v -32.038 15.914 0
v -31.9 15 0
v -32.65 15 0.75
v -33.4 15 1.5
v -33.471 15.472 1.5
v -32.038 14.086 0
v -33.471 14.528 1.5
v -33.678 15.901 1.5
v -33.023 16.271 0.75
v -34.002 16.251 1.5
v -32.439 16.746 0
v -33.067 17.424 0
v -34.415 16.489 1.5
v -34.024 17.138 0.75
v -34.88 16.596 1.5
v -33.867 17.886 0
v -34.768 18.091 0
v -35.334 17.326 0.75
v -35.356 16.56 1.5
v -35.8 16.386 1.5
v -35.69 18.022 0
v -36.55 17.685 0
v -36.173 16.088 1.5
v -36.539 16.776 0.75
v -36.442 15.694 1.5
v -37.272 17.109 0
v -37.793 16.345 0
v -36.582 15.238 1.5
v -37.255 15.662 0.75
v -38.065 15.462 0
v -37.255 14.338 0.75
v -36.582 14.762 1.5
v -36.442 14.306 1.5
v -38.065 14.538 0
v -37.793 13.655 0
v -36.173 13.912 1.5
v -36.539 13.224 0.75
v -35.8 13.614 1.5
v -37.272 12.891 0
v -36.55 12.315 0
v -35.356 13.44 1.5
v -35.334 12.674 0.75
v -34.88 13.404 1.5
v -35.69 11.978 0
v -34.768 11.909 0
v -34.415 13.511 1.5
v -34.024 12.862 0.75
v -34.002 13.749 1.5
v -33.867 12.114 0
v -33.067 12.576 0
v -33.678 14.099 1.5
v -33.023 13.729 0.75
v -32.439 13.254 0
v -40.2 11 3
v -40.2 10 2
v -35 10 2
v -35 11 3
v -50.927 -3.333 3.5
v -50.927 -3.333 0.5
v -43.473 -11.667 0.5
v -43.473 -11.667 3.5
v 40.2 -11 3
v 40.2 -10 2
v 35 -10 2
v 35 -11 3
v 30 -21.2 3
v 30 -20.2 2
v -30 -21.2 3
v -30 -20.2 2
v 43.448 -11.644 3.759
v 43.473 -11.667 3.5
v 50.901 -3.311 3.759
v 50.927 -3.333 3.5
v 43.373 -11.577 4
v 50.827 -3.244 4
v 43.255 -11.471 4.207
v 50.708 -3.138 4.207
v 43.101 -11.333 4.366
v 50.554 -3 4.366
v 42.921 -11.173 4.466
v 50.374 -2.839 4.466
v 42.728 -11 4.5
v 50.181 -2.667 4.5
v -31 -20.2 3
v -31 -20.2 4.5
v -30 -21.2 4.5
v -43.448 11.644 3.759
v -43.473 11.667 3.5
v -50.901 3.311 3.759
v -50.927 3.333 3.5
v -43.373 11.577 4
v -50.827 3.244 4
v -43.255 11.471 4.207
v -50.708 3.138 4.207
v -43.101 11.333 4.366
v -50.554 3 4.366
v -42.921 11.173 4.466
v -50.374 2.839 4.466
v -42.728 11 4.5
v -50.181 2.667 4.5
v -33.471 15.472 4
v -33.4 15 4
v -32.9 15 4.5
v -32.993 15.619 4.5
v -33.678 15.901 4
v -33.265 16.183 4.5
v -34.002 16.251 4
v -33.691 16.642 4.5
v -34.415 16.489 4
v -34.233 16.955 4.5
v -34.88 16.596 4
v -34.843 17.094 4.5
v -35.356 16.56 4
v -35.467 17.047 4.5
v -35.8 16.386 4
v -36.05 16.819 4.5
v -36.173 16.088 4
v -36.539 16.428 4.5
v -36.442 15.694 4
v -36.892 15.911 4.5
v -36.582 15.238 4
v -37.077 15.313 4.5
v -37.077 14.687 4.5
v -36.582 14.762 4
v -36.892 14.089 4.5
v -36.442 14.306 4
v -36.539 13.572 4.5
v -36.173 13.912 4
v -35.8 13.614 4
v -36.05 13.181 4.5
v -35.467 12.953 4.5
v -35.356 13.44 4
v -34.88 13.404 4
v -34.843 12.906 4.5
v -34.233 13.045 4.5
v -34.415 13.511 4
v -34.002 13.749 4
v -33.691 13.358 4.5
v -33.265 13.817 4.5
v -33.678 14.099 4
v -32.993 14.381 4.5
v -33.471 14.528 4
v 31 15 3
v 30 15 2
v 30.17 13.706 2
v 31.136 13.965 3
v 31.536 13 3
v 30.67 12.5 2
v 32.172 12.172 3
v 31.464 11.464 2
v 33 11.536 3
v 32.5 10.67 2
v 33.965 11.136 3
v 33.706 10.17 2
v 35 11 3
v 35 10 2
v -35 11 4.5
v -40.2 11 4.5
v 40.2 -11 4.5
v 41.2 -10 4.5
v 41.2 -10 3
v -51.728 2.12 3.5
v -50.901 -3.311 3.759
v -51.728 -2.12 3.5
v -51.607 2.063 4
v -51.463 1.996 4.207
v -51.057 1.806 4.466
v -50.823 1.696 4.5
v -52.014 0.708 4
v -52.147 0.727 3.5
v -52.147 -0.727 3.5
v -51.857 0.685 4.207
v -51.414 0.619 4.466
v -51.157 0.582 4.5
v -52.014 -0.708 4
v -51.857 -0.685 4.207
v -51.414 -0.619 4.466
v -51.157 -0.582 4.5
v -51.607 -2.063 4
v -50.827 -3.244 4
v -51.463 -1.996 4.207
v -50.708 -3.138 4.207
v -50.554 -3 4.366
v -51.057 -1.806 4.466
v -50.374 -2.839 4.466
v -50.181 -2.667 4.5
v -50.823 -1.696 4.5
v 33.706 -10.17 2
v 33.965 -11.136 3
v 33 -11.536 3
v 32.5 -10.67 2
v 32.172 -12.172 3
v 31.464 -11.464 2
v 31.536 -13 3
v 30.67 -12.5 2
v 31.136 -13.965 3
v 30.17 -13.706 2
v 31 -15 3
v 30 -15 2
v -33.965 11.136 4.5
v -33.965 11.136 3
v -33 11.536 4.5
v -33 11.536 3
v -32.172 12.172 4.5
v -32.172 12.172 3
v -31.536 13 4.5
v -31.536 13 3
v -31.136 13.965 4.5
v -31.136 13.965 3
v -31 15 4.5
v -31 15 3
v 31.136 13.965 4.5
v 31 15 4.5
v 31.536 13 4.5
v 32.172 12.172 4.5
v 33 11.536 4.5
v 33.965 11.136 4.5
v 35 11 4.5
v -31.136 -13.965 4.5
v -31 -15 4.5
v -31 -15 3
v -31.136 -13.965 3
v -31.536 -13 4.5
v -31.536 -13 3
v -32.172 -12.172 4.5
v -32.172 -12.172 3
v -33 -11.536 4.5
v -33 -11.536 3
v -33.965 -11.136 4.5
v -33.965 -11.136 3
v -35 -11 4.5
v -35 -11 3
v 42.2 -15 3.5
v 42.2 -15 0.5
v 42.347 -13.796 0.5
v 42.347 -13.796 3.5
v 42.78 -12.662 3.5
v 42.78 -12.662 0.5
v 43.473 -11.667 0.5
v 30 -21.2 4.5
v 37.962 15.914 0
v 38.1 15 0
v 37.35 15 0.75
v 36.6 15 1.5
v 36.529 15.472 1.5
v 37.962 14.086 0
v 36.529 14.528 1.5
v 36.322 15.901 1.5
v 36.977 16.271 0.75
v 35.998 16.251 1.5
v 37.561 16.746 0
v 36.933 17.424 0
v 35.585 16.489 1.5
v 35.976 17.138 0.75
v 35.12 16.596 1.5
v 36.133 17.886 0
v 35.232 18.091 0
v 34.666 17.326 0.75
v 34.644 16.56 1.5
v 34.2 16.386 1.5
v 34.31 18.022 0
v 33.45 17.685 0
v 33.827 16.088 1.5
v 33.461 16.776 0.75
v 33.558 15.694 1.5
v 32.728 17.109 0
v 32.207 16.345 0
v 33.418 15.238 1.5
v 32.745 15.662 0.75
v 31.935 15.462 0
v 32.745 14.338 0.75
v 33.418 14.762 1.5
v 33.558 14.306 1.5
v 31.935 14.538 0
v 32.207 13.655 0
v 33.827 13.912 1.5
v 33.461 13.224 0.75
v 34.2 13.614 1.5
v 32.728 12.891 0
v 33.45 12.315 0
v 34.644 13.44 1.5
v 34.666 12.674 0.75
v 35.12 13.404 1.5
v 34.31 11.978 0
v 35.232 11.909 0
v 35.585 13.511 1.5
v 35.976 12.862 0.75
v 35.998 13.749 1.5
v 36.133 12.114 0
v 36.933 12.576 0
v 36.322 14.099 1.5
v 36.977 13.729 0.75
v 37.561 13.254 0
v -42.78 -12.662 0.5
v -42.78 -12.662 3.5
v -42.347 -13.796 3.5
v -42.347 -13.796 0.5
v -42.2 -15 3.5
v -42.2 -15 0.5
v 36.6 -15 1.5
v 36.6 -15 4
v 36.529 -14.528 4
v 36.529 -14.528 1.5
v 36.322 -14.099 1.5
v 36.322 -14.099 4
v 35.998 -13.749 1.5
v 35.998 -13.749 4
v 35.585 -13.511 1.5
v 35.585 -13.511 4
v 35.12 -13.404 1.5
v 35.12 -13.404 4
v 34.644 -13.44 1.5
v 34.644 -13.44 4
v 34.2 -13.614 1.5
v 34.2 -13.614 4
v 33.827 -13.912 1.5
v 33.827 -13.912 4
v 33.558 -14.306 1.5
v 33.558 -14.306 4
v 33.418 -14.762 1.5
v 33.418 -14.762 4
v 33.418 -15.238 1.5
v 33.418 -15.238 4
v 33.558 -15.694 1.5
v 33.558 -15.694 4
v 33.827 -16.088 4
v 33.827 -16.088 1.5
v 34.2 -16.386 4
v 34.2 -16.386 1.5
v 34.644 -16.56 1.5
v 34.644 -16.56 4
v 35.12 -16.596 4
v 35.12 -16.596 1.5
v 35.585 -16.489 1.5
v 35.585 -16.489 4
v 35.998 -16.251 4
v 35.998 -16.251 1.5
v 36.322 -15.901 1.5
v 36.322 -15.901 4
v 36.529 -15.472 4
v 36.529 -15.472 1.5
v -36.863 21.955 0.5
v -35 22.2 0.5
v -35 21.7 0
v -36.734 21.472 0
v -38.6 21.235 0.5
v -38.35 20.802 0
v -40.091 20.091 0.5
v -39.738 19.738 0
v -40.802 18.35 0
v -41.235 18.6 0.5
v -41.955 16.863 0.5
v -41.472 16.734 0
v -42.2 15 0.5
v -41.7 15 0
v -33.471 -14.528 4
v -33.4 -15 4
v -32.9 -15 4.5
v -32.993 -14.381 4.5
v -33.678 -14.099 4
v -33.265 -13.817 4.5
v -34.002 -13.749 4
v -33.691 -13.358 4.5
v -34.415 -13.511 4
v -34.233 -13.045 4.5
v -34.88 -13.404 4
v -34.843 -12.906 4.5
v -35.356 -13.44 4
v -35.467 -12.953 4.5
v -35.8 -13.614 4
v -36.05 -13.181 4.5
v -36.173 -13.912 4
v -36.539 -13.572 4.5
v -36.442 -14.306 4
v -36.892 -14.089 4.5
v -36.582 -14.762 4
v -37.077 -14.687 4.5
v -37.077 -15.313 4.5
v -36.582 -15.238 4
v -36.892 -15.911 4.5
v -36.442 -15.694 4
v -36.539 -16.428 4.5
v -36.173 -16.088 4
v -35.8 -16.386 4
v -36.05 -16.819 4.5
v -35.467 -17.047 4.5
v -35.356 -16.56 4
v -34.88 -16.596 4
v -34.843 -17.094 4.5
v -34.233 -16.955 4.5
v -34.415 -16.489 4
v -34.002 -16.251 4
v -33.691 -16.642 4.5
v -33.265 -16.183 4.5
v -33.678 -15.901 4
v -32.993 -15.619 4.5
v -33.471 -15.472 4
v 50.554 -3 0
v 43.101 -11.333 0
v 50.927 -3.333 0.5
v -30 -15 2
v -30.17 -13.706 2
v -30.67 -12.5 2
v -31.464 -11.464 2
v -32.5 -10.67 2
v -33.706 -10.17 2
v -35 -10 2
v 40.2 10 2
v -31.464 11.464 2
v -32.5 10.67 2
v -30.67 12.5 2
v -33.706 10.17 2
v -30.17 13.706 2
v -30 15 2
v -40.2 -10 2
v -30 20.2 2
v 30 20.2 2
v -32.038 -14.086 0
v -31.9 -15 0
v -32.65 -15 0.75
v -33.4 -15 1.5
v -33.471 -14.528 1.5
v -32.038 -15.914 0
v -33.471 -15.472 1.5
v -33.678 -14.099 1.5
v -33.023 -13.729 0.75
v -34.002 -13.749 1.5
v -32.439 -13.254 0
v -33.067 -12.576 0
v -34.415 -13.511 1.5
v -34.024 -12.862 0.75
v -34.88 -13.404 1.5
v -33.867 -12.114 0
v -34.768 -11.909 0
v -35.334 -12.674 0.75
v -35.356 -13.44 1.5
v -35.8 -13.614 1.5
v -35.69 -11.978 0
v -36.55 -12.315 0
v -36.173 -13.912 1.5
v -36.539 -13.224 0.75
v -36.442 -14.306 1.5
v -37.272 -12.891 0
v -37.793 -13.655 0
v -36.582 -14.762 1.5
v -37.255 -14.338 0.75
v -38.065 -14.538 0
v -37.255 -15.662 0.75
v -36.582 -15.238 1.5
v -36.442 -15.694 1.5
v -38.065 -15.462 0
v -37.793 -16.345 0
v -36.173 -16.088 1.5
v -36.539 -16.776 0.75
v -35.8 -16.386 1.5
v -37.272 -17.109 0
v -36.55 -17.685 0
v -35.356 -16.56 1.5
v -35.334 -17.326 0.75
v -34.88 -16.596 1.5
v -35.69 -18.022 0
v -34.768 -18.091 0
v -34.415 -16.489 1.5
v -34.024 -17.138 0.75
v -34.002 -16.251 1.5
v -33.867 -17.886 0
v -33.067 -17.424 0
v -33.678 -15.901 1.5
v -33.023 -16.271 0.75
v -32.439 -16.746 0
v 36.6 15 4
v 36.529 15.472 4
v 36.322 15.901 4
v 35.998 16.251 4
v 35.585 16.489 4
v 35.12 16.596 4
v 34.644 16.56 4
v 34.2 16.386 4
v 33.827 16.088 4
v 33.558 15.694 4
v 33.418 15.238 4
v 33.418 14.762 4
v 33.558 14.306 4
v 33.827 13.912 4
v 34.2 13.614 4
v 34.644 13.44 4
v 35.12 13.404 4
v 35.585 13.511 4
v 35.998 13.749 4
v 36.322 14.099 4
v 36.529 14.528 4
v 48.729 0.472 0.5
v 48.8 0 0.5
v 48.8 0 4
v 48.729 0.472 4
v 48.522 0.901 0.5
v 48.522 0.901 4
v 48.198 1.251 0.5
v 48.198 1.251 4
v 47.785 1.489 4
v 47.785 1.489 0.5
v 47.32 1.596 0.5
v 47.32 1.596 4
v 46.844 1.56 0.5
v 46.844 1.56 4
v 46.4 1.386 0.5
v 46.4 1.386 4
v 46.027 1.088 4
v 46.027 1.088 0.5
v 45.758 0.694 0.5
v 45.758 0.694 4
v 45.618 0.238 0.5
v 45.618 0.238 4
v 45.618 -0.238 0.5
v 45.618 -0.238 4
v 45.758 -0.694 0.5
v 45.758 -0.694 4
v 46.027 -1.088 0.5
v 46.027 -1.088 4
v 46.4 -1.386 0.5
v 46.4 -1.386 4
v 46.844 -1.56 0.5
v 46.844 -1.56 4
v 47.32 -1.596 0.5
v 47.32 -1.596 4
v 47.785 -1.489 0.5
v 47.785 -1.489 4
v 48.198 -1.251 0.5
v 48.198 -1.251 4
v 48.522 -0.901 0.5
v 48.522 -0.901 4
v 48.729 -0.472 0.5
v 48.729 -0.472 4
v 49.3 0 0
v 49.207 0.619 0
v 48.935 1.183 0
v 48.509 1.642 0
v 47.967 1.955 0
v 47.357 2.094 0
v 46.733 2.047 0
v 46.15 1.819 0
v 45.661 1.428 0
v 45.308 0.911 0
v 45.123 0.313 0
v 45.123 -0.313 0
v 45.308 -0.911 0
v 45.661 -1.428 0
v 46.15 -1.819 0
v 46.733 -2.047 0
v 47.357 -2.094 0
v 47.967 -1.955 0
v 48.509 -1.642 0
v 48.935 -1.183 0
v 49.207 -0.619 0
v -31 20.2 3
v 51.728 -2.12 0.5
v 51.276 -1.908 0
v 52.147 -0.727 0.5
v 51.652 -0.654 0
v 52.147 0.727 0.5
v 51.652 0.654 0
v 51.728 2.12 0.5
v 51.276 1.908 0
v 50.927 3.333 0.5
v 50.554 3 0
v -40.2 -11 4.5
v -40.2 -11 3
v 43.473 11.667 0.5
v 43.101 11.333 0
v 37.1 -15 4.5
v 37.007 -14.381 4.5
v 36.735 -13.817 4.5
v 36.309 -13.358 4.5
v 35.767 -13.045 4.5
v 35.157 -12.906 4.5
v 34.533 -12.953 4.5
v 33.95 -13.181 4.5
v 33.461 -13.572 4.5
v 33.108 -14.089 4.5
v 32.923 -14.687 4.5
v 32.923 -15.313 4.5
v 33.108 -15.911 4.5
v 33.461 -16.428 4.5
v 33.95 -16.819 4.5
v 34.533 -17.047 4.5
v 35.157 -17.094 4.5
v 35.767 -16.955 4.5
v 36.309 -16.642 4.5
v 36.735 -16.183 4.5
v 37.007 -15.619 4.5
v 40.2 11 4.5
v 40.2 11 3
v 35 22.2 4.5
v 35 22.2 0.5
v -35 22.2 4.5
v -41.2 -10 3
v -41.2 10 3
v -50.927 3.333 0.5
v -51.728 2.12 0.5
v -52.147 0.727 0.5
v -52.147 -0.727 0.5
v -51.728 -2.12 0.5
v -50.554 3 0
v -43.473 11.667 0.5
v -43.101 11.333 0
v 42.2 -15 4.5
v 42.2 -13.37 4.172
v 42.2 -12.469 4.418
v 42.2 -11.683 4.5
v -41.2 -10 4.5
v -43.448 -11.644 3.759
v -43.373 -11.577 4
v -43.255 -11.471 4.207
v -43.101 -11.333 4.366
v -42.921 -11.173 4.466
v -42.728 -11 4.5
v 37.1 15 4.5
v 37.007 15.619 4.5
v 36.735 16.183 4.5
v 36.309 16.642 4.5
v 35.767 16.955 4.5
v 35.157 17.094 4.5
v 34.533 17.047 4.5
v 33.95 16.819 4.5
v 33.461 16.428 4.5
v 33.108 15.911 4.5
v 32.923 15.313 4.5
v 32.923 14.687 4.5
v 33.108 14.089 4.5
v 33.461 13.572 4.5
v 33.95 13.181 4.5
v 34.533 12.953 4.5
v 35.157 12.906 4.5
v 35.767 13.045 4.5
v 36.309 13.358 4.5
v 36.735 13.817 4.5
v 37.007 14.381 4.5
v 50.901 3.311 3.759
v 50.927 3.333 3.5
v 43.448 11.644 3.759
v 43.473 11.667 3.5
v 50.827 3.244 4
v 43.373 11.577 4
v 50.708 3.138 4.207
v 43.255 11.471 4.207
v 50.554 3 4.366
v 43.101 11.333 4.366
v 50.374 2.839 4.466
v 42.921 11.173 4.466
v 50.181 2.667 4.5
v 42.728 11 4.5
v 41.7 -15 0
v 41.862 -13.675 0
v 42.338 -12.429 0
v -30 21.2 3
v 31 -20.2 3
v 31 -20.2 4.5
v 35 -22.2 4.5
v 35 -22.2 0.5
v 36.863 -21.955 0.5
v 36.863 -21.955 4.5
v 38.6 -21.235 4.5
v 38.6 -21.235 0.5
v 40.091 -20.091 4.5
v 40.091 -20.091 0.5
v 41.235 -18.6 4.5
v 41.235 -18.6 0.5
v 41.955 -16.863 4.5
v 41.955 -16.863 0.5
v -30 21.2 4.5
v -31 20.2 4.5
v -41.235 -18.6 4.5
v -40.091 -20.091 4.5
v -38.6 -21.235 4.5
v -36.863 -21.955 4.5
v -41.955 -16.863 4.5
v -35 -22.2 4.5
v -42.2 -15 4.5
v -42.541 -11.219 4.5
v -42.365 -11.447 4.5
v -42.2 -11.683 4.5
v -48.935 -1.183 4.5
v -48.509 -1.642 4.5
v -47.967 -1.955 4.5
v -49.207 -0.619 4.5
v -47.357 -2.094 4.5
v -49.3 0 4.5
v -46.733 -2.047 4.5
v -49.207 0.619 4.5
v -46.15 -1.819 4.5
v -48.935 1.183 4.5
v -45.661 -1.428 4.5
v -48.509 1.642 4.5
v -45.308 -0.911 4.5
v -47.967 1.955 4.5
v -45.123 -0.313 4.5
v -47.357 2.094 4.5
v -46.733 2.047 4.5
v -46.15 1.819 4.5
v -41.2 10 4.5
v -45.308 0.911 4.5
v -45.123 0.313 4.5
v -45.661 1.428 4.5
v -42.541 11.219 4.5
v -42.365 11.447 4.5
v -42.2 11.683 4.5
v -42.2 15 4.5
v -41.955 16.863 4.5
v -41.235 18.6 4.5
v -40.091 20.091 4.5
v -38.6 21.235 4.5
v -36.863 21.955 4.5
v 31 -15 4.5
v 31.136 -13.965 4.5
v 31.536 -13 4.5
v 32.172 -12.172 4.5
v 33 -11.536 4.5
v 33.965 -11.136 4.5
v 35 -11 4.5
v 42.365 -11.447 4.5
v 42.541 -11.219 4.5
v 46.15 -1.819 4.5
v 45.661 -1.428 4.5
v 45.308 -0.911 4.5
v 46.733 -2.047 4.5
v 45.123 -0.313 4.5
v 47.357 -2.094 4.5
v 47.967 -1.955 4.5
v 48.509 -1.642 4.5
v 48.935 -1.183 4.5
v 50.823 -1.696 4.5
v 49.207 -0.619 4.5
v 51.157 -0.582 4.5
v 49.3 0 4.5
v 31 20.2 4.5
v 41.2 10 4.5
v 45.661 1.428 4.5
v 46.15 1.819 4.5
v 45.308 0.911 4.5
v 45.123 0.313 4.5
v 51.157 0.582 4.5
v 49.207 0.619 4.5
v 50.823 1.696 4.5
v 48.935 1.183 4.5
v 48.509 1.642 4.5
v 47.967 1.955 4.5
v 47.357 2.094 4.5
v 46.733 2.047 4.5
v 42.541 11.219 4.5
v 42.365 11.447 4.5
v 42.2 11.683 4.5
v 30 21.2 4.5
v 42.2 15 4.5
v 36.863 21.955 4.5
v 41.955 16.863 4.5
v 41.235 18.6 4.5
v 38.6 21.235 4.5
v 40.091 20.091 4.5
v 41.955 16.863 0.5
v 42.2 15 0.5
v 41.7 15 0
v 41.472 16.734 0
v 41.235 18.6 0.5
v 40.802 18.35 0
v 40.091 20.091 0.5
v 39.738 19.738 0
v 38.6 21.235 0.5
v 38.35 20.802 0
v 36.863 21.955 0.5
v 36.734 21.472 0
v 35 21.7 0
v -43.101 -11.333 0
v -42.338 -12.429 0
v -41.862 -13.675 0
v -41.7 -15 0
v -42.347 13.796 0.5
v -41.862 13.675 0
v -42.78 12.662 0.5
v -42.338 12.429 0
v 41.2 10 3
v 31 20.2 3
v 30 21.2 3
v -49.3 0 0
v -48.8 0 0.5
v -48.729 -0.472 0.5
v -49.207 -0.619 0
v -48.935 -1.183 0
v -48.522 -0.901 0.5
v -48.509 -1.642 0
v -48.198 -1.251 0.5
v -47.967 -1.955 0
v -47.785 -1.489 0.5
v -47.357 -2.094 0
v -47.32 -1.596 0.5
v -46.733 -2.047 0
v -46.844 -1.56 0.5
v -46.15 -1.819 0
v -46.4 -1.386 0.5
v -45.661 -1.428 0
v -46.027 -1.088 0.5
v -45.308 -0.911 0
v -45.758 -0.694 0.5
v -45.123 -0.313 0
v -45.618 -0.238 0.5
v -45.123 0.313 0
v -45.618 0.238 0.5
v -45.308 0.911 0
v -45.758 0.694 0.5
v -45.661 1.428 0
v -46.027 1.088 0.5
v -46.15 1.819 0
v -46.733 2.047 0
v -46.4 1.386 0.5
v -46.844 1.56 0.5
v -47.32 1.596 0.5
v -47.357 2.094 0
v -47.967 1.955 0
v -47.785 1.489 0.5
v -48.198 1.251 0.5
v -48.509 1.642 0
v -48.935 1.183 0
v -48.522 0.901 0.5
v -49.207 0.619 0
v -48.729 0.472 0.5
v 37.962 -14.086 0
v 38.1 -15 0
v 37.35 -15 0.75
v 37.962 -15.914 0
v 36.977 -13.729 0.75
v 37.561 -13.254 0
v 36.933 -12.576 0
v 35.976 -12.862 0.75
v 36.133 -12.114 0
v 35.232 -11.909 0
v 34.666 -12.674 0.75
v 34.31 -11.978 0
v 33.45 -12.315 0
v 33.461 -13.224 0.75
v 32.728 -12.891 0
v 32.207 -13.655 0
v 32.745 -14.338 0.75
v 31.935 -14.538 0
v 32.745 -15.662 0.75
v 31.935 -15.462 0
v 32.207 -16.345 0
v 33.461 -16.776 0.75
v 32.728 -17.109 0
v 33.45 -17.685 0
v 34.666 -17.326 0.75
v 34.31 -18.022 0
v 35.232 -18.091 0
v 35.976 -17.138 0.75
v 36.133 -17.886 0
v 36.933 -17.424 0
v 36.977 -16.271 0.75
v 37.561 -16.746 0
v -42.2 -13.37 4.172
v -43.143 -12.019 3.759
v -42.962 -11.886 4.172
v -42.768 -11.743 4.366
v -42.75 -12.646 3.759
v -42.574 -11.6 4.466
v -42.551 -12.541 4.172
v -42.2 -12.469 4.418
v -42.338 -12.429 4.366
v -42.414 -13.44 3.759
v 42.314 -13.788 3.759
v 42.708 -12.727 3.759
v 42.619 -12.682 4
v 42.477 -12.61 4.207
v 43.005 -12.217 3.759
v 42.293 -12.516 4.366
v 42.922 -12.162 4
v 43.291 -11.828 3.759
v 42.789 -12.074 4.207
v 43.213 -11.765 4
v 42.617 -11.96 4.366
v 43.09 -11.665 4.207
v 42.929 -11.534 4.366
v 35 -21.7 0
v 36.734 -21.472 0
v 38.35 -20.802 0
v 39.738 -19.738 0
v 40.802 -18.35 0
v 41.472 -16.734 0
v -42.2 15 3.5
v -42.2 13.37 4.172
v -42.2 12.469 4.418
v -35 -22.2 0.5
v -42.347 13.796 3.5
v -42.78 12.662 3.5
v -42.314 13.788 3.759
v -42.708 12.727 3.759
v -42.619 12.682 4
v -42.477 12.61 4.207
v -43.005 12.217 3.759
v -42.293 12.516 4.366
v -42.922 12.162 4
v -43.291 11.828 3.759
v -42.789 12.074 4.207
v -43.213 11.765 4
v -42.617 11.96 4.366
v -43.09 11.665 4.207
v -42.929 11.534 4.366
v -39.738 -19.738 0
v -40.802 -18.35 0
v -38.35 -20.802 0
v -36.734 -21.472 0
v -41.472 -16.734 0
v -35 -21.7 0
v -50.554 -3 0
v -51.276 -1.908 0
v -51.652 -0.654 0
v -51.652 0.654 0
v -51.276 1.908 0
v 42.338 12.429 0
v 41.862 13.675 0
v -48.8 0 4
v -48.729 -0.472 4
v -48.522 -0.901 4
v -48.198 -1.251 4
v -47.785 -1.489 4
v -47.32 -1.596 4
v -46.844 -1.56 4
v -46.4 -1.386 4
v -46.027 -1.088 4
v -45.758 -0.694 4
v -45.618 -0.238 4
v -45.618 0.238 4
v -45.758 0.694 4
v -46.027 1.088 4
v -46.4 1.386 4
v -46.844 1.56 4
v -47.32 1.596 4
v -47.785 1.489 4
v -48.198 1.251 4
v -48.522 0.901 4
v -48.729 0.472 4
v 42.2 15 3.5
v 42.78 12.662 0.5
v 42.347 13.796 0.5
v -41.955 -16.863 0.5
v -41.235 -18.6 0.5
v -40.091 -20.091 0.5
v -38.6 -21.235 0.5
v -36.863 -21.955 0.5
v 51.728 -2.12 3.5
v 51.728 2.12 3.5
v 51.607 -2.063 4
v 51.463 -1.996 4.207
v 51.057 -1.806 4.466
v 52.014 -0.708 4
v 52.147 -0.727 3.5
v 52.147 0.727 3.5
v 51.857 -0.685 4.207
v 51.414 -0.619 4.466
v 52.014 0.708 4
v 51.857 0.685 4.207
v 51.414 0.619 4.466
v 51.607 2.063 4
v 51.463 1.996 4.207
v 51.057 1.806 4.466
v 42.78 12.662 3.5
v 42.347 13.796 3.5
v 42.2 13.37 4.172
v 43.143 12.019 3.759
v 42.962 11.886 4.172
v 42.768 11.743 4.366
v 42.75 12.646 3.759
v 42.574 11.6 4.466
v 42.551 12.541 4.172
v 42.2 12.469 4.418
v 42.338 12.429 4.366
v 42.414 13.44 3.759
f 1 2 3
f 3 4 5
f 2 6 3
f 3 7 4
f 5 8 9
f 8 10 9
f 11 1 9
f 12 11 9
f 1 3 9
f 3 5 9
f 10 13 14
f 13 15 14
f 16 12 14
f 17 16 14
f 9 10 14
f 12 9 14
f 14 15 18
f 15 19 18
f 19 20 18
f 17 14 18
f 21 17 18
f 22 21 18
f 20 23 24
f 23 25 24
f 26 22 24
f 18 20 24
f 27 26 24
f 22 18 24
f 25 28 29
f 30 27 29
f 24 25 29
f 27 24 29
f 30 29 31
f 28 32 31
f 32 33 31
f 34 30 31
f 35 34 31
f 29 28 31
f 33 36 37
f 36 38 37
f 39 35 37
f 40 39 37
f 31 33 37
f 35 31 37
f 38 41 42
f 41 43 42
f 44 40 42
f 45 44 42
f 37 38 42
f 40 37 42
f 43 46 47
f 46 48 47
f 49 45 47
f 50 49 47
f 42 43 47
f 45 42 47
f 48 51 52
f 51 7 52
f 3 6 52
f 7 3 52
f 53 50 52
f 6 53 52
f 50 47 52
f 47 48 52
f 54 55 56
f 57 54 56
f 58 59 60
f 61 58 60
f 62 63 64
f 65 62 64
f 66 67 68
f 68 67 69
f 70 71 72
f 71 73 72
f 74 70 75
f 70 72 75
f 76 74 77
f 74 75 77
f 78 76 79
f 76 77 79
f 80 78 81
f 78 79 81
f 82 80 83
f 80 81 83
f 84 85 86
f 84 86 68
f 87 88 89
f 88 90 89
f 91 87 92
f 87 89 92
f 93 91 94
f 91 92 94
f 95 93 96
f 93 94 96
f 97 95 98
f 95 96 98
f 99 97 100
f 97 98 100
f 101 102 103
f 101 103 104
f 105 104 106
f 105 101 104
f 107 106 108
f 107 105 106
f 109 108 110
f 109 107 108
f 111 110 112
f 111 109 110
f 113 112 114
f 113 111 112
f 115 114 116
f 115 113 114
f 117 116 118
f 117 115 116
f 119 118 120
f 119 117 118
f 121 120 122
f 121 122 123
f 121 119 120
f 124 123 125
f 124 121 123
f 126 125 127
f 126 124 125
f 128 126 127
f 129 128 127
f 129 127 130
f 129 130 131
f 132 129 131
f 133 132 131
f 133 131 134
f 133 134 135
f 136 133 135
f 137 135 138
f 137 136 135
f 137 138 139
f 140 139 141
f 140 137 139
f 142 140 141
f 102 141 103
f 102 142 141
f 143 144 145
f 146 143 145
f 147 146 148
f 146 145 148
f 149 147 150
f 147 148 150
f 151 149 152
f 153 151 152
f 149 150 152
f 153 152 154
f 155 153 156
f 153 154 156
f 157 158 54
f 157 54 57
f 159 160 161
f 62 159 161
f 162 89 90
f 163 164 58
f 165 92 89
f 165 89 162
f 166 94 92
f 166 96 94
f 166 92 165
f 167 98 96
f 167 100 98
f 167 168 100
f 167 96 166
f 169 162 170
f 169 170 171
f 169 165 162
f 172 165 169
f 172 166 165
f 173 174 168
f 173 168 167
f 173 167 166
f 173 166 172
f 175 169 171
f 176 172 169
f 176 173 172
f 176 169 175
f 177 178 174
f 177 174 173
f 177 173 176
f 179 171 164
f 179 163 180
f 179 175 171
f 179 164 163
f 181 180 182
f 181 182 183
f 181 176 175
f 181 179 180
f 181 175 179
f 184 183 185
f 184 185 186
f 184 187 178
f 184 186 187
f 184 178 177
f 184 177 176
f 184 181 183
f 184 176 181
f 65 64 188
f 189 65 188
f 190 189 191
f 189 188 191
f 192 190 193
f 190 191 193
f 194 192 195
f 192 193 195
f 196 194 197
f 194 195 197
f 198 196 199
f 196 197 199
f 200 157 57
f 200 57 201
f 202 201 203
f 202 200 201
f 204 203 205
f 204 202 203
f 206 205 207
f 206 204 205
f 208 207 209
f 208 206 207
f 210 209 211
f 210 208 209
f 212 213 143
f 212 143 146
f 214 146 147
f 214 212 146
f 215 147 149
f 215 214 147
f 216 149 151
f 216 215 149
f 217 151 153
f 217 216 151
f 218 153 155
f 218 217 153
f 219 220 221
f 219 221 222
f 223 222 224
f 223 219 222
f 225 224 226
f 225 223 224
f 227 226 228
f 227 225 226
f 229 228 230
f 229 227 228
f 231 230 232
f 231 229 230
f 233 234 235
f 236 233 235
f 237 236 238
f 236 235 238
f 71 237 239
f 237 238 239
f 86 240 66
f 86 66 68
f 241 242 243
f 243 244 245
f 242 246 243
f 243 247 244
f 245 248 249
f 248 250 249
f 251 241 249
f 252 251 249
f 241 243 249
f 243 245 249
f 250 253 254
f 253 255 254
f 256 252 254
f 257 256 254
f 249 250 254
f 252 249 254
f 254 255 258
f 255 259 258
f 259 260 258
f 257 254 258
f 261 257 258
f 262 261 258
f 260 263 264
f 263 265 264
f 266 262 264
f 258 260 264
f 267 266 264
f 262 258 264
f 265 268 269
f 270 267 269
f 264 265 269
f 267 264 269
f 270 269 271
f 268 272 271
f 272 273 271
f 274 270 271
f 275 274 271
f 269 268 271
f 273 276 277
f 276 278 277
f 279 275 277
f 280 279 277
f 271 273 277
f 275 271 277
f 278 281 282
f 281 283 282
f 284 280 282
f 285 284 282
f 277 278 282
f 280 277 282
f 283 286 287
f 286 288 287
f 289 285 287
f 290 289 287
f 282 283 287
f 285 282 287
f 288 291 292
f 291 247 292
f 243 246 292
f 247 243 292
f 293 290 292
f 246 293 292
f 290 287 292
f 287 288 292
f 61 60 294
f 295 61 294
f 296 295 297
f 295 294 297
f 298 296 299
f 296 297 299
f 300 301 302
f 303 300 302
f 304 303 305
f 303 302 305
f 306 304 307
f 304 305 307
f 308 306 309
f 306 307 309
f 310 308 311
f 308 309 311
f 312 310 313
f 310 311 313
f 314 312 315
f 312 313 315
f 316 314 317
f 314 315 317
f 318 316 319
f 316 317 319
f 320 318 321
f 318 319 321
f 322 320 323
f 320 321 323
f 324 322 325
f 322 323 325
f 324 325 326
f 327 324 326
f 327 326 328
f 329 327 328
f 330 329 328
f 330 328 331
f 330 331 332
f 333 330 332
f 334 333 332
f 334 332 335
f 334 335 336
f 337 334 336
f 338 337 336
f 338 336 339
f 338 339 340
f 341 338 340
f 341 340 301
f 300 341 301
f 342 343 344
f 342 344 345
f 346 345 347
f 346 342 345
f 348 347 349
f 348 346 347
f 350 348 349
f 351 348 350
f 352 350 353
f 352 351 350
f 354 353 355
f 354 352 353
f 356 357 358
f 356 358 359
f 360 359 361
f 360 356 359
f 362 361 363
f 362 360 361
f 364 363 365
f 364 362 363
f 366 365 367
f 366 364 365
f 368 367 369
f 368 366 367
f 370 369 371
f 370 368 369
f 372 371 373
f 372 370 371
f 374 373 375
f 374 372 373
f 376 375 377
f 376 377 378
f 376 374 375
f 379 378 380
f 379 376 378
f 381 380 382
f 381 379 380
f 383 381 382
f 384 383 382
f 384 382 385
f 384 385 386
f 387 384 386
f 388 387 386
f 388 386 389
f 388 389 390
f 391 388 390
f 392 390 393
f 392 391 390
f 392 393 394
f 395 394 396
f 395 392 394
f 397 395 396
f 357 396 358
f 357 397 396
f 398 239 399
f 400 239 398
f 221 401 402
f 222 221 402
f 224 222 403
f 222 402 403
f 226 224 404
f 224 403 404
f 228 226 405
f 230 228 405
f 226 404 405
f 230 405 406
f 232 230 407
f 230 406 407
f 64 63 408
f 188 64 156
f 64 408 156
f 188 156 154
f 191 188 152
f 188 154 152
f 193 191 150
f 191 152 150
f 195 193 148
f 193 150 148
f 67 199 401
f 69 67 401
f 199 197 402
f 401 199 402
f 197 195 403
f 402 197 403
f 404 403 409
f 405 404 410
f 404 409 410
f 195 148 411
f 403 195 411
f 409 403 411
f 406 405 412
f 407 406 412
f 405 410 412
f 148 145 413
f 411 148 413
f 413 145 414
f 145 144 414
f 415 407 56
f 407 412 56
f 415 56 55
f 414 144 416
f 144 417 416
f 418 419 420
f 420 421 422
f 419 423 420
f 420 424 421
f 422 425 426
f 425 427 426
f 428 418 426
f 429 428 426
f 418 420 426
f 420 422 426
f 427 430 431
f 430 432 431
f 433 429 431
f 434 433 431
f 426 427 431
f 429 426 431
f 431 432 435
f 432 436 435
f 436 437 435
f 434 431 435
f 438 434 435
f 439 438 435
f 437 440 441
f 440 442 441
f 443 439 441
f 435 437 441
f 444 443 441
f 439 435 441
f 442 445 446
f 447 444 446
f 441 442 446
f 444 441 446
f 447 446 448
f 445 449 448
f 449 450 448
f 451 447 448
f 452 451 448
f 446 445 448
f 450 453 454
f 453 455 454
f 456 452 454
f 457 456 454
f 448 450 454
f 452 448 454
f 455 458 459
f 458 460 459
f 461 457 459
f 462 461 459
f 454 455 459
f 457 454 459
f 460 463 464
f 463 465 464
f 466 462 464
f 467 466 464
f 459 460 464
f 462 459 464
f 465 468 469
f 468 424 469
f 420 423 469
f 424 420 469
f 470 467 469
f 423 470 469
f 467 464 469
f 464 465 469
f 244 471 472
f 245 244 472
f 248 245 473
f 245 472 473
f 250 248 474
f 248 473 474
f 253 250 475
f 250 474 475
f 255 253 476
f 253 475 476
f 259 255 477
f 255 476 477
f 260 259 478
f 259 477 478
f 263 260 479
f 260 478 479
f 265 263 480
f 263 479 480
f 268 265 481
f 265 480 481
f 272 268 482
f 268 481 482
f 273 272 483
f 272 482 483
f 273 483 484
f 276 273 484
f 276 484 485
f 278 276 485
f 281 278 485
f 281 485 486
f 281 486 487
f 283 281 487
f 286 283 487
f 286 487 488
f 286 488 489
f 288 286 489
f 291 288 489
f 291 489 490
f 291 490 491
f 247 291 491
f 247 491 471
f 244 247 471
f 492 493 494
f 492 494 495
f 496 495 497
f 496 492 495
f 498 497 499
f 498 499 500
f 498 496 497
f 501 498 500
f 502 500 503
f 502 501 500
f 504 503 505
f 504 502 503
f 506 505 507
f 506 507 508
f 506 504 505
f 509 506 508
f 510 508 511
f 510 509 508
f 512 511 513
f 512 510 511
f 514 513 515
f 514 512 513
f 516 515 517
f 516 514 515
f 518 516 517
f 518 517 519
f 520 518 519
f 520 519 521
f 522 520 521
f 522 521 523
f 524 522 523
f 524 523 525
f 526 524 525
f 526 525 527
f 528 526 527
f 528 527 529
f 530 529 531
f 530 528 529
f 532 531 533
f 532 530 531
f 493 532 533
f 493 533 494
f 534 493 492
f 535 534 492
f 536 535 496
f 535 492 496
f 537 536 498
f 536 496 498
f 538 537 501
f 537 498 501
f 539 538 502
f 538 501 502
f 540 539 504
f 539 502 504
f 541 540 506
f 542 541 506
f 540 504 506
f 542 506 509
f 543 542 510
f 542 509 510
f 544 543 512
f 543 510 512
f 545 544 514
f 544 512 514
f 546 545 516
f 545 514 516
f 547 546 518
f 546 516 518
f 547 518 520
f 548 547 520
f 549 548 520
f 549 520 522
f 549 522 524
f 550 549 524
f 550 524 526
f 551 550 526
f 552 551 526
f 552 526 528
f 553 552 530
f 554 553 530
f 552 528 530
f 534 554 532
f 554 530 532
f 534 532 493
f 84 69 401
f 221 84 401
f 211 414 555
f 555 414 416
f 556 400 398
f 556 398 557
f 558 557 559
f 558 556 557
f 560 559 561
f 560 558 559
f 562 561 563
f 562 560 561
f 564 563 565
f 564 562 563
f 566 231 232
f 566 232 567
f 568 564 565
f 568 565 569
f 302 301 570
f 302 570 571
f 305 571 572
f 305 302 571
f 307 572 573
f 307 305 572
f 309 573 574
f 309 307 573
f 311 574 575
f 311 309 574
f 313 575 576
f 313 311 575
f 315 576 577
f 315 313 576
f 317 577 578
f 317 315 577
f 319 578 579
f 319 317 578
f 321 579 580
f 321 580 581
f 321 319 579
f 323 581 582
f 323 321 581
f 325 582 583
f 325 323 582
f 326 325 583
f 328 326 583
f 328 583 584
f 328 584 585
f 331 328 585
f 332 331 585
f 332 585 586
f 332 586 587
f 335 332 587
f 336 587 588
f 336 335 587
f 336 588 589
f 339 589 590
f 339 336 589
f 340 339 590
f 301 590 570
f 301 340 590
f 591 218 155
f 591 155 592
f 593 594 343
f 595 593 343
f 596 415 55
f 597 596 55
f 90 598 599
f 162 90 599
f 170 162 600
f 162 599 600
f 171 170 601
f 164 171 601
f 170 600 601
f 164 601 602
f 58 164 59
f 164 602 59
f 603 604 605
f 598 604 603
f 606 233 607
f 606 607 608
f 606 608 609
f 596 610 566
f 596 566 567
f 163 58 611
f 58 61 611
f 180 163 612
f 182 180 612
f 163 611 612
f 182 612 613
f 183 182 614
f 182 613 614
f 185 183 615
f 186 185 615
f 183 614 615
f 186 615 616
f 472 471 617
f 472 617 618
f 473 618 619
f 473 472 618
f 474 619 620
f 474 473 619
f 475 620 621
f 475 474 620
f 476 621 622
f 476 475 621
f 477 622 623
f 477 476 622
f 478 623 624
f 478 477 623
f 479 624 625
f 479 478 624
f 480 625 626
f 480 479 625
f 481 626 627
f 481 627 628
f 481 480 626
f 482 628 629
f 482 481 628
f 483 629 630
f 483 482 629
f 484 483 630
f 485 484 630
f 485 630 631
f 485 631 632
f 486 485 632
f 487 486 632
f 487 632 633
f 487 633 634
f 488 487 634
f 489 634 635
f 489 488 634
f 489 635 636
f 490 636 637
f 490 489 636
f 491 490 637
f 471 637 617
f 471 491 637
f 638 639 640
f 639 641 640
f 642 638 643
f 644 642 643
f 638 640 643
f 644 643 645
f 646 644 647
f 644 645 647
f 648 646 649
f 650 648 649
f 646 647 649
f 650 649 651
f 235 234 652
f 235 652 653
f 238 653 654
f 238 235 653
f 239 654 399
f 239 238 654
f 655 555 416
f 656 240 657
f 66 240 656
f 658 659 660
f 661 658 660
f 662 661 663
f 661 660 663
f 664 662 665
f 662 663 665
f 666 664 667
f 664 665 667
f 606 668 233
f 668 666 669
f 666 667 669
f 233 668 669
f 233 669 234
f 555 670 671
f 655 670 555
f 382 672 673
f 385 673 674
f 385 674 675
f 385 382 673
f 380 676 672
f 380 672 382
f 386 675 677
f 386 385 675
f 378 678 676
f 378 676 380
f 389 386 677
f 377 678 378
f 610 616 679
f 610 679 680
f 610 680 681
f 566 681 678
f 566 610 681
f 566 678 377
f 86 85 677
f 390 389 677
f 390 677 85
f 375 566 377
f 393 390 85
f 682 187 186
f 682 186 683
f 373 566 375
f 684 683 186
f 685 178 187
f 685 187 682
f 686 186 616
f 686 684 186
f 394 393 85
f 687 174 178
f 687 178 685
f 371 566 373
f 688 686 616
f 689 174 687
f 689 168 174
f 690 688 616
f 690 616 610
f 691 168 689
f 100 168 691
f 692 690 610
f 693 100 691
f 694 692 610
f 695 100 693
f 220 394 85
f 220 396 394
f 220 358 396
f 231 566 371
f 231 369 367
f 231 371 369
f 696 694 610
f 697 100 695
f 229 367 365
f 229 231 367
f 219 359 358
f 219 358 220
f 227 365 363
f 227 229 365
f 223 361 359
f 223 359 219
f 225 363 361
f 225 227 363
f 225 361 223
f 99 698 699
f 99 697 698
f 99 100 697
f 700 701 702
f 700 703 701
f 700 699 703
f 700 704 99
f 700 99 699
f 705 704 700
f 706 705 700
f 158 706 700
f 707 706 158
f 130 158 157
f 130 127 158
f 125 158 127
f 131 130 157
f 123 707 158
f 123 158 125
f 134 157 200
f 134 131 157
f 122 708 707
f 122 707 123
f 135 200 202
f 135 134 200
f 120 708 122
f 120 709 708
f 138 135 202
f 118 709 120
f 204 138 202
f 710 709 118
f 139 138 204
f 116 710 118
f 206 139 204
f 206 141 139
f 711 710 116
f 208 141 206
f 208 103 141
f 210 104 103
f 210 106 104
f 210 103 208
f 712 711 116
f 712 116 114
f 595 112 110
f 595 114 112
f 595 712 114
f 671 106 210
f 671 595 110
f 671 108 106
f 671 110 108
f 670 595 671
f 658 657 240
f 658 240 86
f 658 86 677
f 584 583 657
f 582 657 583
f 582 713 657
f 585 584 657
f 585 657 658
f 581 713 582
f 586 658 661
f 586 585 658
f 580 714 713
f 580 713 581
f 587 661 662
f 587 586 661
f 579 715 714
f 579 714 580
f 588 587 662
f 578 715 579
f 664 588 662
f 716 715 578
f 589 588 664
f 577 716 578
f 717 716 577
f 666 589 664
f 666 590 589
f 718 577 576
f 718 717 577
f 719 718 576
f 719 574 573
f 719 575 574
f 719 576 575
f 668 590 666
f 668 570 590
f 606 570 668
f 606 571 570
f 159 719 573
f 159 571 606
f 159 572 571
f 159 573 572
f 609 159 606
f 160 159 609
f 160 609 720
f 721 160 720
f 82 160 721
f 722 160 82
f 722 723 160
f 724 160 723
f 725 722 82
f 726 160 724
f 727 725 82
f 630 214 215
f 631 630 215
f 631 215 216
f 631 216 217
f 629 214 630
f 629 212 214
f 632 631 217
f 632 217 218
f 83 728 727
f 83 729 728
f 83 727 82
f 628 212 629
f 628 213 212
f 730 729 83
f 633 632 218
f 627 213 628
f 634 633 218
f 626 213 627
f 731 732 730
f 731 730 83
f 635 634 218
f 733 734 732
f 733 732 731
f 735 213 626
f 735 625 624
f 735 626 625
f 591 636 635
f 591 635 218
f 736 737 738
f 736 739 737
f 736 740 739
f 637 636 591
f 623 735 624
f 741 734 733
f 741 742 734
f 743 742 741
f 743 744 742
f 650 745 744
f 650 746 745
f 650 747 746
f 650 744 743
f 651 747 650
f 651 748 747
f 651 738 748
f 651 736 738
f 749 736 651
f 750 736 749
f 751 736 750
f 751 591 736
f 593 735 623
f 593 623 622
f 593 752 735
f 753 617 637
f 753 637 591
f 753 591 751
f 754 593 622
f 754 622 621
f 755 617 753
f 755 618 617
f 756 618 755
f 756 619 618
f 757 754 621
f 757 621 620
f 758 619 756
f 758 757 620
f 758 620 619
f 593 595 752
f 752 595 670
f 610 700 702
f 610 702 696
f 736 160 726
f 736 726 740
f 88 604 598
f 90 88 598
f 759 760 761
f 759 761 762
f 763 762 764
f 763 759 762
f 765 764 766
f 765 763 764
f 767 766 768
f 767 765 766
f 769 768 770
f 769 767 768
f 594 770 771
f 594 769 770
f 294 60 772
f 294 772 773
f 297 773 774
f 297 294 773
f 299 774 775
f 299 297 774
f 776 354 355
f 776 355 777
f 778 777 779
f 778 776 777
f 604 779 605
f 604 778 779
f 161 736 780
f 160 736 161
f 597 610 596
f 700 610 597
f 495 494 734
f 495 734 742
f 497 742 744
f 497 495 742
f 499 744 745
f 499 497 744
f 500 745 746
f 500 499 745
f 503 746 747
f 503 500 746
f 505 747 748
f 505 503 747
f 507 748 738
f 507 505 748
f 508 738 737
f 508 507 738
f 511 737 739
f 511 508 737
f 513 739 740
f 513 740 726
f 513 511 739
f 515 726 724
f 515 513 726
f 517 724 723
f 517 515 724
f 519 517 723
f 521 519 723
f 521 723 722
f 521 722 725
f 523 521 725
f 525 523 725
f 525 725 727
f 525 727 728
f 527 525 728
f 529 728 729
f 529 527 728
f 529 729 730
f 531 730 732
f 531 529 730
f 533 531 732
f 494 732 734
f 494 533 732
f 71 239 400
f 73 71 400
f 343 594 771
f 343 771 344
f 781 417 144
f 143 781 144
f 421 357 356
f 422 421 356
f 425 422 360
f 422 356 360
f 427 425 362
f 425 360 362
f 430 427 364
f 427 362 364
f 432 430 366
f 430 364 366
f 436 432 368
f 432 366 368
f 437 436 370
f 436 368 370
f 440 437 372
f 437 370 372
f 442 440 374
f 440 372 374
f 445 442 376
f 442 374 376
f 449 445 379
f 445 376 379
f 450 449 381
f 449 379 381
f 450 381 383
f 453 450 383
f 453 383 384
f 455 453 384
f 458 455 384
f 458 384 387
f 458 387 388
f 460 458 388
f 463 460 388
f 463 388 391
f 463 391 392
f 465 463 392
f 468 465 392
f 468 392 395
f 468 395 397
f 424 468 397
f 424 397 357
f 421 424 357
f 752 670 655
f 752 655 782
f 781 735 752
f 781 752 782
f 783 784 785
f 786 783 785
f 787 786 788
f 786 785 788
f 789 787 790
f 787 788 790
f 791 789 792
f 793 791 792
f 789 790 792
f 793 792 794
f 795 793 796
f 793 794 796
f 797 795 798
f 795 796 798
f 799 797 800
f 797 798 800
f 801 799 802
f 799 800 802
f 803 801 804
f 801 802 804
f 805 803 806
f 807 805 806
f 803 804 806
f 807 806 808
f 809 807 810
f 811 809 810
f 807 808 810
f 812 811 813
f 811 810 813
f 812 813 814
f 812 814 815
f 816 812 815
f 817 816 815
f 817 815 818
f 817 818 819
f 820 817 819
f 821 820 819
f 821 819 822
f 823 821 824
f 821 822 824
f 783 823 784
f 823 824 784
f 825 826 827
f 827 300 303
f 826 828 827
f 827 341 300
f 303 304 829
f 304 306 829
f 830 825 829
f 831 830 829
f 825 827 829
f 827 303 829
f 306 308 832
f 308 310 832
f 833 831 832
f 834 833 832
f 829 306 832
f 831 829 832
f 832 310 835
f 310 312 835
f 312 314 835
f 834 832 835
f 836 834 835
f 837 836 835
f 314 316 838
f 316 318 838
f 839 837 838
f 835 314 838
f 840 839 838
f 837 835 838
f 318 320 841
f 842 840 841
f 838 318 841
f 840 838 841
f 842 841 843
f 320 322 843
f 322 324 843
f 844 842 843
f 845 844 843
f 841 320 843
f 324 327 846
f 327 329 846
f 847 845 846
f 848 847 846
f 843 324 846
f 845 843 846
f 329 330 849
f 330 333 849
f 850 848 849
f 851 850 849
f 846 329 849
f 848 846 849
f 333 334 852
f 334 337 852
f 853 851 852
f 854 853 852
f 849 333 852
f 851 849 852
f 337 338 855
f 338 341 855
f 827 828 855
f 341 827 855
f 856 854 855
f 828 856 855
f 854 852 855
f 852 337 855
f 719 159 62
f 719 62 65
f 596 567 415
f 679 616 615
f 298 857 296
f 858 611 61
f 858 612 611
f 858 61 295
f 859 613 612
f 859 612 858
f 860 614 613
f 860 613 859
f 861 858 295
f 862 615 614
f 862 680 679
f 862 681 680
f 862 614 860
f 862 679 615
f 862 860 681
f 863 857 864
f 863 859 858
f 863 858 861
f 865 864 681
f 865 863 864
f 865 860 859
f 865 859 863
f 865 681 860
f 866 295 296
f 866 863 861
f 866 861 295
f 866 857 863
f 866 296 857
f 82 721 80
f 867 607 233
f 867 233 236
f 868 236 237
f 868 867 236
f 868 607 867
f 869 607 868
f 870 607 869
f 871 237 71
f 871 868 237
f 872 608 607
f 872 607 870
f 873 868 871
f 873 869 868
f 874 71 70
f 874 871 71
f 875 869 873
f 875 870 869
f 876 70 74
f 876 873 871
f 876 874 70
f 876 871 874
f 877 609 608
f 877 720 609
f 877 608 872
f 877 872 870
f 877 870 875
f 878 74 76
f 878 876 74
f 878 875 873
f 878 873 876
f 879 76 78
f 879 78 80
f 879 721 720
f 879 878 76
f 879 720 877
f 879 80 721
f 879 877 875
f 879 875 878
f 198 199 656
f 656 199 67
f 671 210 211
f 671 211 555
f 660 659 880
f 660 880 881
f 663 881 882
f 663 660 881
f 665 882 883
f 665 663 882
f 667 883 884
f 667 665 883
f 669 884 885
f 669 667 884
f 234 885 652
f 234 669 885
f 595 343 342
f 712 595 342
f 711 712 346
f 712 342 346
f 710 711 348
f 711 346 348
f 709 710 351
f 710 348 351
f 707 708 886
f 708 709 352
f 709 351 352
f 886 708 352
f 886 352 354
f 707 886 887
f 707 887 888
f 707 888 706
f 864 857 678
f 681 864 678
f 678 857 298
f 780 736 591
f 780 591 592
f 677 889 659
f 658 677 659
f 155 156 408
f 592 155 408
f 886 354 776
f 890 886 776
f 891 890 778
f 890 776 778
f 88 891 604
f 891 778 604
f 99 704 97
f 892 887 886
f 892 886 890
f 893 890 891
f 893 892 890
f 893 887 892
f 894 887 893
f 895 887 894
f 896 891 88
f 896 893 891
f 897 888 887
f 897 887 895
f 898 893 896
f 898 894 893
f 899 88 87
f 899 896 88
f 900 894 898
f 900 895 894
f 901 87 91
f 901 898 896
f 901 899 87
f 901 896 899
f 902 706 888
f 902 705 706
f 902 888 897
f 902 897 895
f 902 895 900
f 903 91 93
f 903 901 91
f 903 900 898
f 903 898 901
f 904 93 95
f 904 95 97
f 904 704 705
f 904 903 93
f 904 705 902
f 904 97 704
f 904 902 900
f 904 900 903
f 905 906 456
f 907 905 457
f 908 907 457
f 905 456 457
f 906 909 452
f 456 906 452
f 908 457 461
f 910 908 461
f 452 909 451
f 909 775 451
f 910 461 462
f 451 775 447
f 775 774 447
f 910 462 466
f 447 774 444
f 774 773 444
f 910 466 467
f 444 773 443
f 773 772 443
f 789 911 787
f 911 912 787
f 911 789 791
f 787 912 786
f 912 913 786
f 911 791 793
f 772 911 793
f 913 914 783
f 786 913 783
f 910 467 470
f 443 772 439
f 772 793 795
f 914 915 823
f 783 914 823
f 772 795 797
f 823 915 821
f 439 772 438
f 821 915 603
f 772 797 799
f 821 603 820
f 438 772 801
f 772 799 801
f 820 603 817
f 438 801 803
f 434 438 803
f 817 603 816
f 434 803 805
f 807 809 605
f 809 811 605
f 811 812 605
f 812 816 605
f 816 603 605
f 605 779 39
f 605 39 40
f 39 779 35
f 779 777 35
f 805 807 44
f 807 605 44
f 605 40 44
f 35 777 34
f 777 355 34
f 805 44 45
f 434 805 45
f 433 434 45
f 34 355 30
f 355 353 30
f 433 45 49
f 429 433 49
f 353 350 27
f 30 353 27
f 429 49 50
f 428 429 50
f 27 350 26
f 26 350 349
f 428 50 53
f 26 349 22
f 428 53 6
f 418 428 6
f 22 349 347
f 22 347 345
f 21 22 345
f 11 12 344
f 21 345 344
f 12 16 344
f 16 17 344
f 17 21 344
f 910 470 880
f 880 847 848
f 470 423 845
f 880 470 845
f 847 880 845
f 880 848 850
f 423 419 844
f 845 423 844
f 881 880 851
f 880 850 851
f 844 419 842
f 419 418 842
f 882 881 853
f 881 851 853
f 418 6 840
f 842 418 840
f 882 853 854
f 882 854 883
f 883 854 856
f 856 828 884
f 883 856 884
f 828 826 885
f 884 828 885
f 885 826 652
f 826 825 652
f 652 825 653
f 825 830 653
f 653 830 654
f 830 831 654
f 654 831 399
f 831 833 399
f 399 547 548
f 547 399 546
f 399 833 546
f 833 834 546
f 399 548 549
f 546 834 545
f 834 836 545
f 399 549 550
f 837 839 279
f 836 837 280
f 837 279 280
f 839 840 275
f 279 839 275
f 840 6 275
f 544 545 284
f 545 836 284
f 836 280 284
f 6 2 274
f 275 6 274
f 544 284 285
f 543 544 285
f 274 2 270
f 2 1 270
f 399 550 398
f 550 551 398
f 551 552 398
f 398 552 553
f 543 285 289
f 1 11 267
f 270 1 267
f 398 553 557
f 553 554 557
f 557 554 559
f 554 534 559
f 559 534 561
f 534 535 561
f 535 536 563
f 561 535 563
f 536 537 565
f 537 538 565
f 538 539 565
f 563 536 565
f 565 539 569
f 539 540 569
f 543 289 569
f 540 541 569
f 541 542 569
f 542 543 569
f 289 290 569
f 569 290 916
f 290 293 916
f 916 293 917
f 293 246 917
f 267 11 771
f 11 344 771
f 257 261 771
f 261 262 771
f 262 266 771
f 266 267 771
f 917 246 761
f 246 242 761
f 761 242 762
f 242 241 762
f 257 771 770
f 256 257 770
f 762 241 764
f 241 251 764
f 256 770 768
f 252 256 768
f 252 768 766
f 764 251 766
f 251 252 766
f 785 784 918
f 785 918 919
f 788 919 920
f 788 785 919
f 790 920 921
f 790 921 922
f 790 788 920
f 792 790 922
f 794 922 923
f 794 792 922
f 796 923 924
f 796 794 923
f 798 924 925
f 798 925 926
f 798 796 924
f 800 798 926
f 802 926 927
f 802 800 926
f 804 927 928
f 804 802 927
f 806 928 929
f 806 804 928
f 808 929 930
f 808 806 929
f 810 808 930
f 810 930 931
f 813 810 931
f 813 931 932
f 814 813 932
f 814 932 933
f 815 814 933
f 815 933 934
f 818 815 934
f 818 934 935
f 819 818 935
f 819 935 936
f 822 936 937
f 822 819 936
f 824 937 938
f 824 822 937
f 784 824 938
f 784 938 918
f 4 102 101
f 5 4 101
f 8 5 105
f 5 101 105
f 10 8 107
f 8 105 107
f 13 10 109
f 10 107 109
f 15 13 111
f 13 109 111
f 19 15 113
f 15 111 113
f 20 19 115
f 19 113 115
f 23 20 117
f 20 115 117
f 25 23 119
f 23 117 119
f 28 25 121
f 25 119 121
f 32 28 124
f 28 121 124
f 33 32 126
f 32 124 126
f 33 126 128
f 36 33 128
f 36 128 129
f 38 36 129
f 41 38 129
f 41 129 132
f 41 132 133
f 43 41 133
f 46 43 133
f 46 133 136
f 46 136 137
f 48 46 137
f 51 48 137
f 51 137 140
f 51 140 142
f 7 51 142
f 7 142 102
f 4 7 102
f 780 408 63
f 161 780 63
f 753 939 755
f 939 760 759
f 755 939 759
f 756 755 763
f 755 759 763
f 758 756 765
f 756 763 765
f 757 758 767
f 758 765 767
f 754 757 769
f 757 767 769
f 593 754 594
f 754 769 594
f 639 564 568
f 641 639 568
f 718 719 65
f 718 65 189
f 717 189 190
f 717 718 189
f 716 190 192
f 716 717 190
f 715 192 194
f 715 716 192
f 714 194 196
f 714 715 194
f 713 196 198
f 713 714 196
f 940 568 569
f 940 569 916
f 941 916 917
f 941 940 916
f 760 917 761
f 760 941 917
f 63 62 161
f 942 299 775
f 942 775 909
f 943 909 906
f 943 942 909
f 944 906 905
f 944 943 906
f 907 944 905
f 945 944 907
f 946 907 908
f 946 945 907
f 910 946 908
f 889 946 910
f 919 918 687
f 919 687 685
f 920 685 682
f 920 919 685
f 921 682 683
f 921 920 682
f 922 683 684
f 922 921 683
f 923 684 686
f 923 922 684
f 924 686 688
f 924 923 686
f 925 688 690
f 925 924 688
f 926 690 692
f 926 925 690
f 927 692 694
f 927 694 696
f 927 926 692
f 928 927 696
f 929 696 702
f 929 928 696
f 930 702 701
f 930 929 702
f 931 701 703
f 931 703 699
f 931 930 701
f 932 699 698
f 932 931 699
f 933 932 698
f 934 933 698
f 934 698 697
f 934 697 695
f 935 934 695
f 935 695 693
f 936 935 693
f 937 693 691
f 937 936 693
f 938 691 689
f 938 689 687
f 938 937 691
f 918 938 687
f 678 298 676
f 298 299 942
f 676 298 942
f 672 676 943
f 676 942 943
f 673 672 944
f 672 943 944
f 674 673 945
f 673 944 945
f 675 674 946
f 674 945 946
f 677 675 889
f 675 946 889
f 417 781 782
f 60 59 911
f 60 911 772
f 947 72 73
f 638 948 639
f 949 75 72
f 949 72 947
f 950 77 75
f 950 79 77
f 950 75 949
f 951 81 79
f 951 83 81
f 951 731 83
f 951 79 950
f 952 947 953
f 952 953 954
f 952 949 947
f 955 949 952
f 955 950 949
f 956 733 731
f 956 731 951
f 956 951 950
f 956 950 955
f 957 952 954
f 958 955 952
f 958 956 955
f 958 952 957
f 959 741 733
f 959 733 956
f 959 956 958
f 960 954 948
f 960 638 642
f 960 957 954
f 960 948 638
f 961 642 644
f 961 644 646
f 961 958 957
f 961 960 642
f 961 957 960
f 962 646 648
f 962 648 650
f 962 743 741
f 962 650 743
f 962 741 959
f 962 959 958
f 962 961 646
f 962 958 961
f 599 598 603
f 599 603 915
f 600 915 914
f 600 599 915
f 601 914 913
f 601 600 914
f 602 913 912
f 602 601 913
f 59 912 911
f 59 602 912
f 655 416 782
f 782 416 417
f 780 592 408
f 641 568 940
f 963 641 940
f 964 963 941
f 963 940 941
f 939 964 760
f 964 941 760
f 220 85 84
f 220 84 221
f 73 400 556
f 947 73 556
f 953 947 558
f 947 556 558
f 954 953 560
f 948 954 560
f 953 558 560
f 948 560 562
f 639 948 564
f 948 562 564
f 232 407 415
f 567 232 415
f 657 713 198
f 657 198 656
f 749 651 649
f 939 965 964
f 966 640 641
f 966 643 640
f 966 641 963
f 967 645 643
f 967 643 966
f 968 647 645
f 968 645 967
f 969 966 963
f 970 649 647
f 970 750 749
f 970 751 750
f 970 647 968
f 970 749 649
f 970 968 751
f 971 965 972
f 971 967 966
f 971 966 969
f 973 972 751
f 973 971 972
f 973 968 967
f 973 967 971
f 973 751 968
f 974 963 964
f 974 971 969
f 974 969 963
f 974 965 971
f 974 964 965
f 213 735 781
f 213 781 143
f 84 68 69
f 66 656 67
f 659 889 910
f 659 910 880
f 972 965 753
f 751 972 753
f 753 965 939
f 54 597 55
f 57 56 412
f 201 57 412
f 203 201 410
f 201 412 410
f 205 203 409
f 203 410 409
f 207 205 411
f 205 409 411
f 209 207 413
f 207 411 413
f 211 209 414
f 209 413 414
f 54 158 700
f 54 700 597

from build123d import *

# Parameters (mm, degrees)
EXTRUDE_1_DEPTH             = 4.5
CUT_EXTRUDE_1_DEPTH         = 2.5
SKETCH_2_3_R                = 1.6
CUT_EXTRUDE_2_DEPTH         = 48.8949893
HOLE_WIZARD_M31_D           = 3.2
HOLE_WIZARD_M31_CSINK_D     = 6.2
HOLE_WIZARD_M31_CSINK_ANGLE = 90
SKETCH_7_R                  = 1.6
EXTRUDE_2_DEPTH             = 4.5
EXTRUDE_2_2_DEPTH           = 4.5
FILLET_1_R                  = 1
FILLET_2_R                  = 1
CHAMFER_1_SIZE              = 0.5
CHAMFER_2_SIZE              = 1


with BuildPart() as part:
    # Эскиз1 → Бобышка-Вытянуть1 (new body)
    with BuildSketch(Plane.XY):
        with BuildLine():
            Line((42.2, -15), (42.2, 15))
            ThreePointArc((42.2, 15), (40.091168825, 20.091168825), (35, 22.2))
            Line((35, 22.2), (-35, 22.2))
            ThreePointArc((-35, 22.2), (-40.091168825, 20.091168825), (-42.2, 15))
            Line((-42.2, 15), (-42.2, -15))
            ThreePointArc((-42.2, -15), (-40.091168825, -20.091168825), (-35, -22.2))
            Line((-35, -22.2), (35, -22.2))
            ThreePointArc((35, -22.2), (40.091168825, -20.091168825), (42.2, -15))
        make_face()
    extrude(amount=EXTRUDE_1_DEPTH)

    # Эскиз2 → Вырез-Вытянуть1 (cut)
    with BuildSketch(Plane.XY.offset(4.5)):
        with BuildLine():
            Line((31, -15), (31, -21.2))
            Line((31, -21.2), (-31, -21.2))
            Line((-31, -21.2), (-31, -15))
            ThreePointArc((-31, -15), (-32.171572875, -12.171572875), (-35, -11))
            Line((-35, -11), (-41.2, -11))
            Line((-41.2, -11), (-41.2, 11))
            Line((-41.2, 11), (-35, 11))
            ThreePointArc((-35, 11), (-32.171572875, 12.171572875), (-31, 15))
            Line((-31, 15), (-31, 21.2))
            Line((-31, 21.2), (31, 21.2))
            Line((31, 21.2), (31, 15))
            ThreePointArc((31, 15), (32.171572875, 12.171572875), (35, 11))
            Line((35, 11), (41.2, 11))
            Line((41.2, 11), (41.2, -11))
            Line((41.2, -11), (35, -11))
            ThreePointArc((35, -11), (32.171572875, -12.171572875), (31, -15))
        make_face()
    extrude(amount=-CUT_EXTRUDE_1_DEPTH, mode=Mode.SUBTRACT)

    # Эскиз2<3> → Вырез-Вытянуть2 (cut, through all)
    with BuildSketch(Plane.XY.offset(4.5)):
        with Locations((35, -15)):
            Circle(SKETCH_2_3_R)
        with Locations((-35, -15)):
            Circle(SKETCH_2_3_R)
        with Locations((-35, 15)):
            Circle(SKETCH_2_3_R)
        with Locations((35, 15)):
            Circle(SKETCH_2_3_R)
    extrude(amount=-CUT_EXTRUDE_2_DEPTH, mode=Mode.SUBTRACT)

    # Зенковка для  винта с потайной головкой с внутренним шестигранником M31 (through all)
    with Locations(Plane(origin=(0, 0, 0), x_dir=(-1, 0, 0), z_dir=(0, 0, -1))):
        with Locations((-35, 15), (-35, -15), (35, -15), (35, 15)):
            CounterSinkHole(HOLE_WIZARD_M31_D / 2, HOLE_WIZARD_M31_CSINK_D / 2, counter_sink_angle=HOLE_WIZARD_M31_CSINK_ANGLE)


with BuildPart() as body_2:
    # Эскиз7 → Бобышка-Вытянуть2 (new body)
    with BuildSketch(Plane.XY):
        with BuildLine():
            Line((43.473220038, -11.666666667), (50.926779962, -3.333333333))
            ThreePointArc((50.926779962, -3.333333333), (52.2, 0), (50.926779962, 3.333333333))
            Line((50.926779962, 3.333333333), (43.473220038, 11.666666667))
            ThreePointArc((43.473220038, 11.666666667), (42.529138205, 13.215889551), (42.2, 15))
            Line((42.2, 15), (42.2, -15))
            ThreePointArc((42.2, -15), (42.529138205, -13.215889551), (43.473220038, -11.666666667))
        make_face()
        with Locations((47.2, 0)):
            Circle(SKETCH_7_R, mode=Mode.SUBTRACT)
    extrude(amount=EXTRUDE_2_DEPTH)

    # Скругление1
    fillet_1_edges = [body_2.edges().sort_by_distance(p)[0] for p in [
        (42.529138205, -13.215889551, 4.5),
        (47.2, -7.5, 4.5),
        (42.529138205, 13.215889551, 4.5),
        (47.2, 7.5, 4.5),
        (52.2, 0, 4.5),
    ]]
    fillet(fillet_1_edges, radius=FILLET_1_R)


with BuildPart() as body_3:
    # Эскиз7 → Extrude 2 2 (new body)
    with BuildSketch(Plane.XY):
        with BuildLine():
            Line((-42.2, -15), (-42.2, 15))
            ThreePointArc((-42.2, 15), (-42.529138205, 13.215889551), (-43.473220038, 11.666666667))
            Line((-43.473220038, 11.666666667), (-50.926779962, 3.333333333))
            ThreePointArc((-50.926779962, 3.333333333), (-52.2, 0), (-50.926779962, -3.333333333))
            Line((-50.926779962, -3.333333333), (-43.473220038, -11.666666667))
            ThreePointArc((-43.473220038, -11.666666667), (-42.529138205, -13.215889551), (-42.2, -15))
        make_face()
        with Locations((-47.2, 0)):
            Circle(SKETCH_7_R, mode=Mode.SUBTRACT)
    extrude(amount=EXTRUDE_2_2_DEPTH)

    # Скругление2
    fillet_2_edges = [body_3.edges().sort_by_distance(p)[0] for p in [
        (-42.529138205, 13.215889551, 4.5),
        (-47.2, 7.5, 4.5),
        (-42.529138205, -13.215889551, 4.5),
        (-47.2, -7.5, 4.5),
        (-52.2, 0, 4.5),
    ]]
    fillet(fillet_2_edges, radius=FILLET_2_R)


with BuildPart() as part_1:
    add(part.part)

    # Combine 1: union body 3, body 2
    add(body_3.part)
    add(body_2.part)

    # Фаска1
    chamfer_1_edges = [part_1.edges().sort_by_distance(p)[0] for p in [
        (0, -22.2, 0),
        (40.091168825, -20.091168825, 0),
        (-40.091168825, -20.091168825, 0),
        (42.529138205, -13.215889551, 0),
        (-42.529138205, -13.215889551, 0),
        (47.2, -7.5, 0),
        (-47.2, -7.5, 0),
        (52.2, 0, 0),
        (-52.2, 0, 0),
        (47.2, 7.5, 0),
        (-47.2, 7.5, 0),
        (42.529138205, 13.215889551, 0),
        (-42.529138205, 13.215889551, 0),
        (40.091168825, 20.091168825, 0),
        (-40.091168825, 20.091168825, 0),
        (0, 22.2, 0),
        (-48.8, 0, 4.5),
        (-36.6, -15, 4.5),
        (-36.6, 15, 4.5),
        (33.4, 15, 4.5),
        (33.4, -15, 4.5),
        (45.6, 0, 4.5),
        (-48.8, 0, 0),
        (45.6, 0, 0),
    ]]
    chamfer(chamfer_1_edges, length=CHAMFER_1_SIZE)

    # Фаска2
    chamfer_2_edges = [part_1.edges().sort_by_distance(p)[0] for p in [
        (-31, -18.1, 2),
        (-38.1, -11, 2),
        (-32.171572875, -12.171572875, 2),
        (-41.2, 0, 2),
        (-38.1, 11, 2),
        (-31, 18.1, 2),
        (-32.171572875, 12.171572875, 2),
        (0, 21.2, 2),
        (38.1, 11, 2),
        (31, 18.1, 2),
        (32.171572875, 12.171572875, 2),
        (41.2, 0, 2),
        (31, -18.1, 2),
        (38.1, -11, 2),
        (32.171572875, -12.171572875, 2),
        (0, -21.2, 2),
        (-41.2, 11, 3.25),
        (-41.2, -11, 3.25),
        (31, 21.2, 3.25),
        (-31, 21.2, 3.25),
        (41.2, 11, 3.25),
        (41.2, -11, 3.25),
        (-31, -21.2, 3.25),
        (31, -21.2, 3.25),
    ]]
    chamfer(chamfer_2_edges, length=CHAMFER_2_SIZE)


solid = part_1.part
